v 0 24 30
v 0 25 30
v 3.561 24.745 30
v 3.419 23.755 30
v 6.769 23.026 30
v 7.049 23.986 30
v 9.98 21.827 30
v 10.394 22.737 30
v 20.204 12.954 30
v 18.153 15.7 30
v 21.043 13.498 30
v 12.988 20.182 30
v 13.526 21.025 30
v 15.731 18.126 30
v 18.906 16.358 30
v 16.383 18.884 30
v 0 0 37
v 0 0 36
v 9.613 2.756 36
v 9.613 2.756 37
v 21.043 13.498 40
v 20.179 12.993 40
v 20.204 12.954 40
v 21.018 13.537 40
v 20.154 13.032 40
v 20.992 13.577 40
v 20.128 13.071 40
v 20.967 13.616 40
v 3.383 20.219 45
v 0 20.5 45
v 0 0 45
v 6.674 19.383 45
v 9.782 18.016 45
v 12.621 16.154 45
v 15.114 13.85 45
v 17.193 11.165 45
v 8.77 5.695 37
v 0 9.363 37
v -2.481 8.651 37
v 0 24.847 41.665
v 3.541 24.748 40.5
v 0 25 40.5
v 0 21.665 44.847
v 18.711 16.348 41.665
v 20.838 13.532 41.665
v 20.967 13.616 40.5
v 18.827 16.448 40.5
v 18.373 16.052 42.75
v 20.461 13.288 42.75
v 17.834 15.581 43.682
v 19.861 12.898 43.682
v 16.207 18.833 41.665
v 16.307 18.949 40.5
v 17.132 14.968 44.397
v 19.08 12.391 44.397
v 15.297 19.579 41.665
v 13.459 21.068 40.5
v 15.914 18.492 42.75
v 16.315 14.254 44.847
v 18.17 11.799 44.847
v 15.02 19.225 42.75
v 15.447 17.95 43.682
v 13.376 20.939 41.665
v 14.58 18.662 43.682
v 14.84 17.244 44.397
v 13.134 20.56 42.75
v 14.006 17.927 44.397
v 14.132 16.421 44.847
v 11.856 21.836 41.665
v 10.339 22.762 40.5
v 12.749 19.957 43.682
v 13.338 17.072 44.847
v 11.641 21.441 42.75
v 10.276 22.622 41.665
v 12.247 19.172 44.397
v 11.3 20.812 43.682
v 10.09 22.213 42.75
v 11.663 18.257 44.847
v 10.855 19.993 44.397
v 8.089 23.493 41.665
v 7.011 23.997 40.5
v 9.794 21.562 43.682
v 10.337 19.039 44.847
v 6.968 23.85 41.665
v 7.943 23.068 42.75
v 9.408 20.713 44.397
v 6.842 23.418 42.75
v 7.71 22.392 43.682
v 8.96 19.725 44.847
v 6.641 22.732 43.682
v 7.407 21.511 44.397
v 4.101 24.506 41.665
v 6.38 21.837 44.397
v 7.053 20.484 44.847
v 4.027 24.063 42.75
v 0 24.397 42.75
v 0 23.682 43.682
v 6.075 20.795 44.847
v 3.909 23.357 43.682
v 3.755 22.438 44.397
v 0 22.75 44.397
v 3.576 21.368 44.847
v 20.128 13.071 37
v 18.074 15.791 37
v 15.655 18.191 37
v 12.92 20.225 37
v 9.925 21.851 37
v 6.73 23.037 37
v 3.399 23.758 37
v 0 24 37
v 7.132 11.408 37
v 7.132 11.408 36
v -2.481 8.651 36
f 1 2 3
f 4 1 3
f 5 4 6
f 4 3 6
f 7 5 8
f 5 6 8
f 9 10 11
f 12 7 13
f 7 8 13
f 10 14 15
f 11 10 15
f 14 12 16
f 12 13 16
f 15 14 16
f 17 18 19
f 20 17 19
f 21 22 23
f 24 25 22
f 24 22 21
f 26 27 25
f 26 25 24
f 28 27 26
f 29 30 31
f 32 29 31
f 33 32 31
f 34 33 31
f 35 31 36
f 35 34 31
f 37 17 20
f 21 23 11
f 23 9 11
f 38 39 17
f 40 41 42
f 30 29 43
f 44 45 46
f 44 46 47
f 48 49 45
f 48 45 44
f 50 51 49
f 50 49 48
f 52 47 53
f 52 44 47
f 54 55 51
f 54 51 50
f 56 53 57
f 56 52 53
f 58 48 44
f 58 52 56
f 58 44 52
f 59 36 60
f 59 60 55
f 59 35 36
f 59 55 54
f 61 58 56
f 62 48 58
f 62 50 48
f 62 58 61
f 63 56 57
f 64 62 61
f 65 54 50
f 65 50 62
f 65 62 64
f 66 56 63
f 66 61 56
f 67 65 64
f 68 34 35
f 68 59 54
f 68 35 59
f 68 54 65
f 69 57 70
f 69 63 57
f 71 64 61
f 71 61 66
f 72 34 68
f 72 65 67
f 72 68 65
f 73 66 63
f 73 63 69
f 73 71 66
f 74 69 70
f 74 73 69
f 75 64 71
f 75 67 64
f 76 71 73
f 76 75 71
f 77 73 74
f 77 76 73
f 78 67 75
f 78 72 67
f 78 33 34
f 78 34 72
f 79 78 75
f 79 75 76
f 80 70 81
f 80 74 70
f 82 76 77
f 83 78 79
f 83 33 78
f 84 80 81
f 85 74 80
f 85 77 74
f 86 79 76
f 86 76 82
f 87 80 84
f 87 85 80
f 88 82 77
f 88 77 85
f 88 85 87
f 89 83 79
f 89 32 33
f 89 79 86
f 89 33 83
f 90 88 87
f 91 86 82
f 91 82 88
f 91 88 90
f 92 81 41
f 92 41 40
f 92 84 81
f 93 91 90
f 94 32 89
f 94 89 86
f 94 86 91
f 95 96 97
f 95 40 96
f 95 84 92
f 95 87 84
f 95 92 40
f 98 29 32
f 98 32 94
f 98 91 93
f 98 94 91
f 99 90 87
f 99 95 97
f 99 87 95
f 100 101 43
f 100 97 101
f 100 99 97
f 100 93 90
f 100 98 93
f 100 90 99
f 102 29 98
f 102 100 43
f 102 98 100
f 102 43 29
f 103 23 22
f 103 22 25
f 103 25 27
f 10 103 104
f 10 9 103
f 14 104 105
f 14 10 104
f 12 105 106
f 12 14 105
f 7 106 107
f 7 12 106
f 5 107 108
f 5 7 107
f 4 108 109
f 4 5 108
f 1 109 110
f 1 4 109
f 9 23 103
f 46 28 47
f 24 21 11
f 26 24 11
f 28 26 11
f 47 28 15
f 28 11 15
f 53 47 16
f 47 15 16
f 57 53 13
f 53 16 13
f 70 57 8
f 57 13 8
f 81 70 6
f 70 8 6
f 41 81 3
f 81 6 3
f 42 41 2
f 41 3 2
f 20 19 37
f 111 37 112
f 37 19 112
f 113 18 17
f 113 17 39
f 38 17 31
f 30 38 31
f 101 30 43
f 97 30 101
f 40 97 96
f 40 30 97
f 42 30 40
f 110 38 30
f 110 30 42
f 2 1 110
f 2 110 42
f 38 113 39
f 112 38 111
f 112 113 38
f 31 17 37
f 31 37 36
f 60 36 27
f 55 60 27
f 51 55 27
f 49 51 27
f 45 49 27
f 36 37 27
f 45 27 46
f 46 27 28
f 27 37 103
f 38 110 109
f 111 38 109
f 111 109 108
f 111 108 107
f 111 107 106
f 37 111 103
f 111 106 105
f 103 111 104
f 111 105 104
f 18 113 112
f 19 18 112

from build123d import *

# Parameters (mm, degrees)
BOX002_W               = 10
BOX002_H               = 9
BOX002_DEPTH           = 1
BOX002_PLACEMENT_ANGLE = 16
CYLINDER001_R          = 22
CYLINDER001_DEPTH      = 37
CYLINDER_R             = 25
CYLINDER_DEPTH         = 40
CYLINDER004_R          = 21
CYLINDER004_DEPTH      = 21
CYLINDER003_R          = 23
CYLINDER003_DEPTH      = 10
CYLINDER002_R          = 25
CYLINDER002_DEPTH      = 5
FILLET_R               = 4.5
BOX001_W               = 37
BOX001_H               = 39
BOX001_DEPTH           = 10
BOX001_PLACEMENT_ANGLE = 57
BOX_W                  = 37
BOX_H                  = 39
BOX_DEPTH              = 10
BOX004_W               = 33
BOX004_H               = 70
BOX004_DEPTH           = 17
BOX003_W               = 33
BOX003_H               = 70
BOX003_DEPTH           = 17
BOX003_PLACEMENT_ANGLE = 57
CYLINDER006_R          = 24
CYLINDER006_DEPTH      = 10
CYLINDER005_R          = 25
CYLINDER005_DEPTH      = 10


with BuildPart() as cubo002:
    # Box002 → Box002 (new body)
    with BuildSketch(Plane.XY):
        with Locations((5, 4.5)):
            Rectangle(BOX002_W, BOX002_H)
    extrude(amount=BOX002_DEPTH)


with BuildPart() as cubo002_1:
    # Box002 placement: moved
    add(cubo002.part.moved(Location((0, 0, 36))).rotate(Axis((0, 0, 36), (0, 0, 1)), BOX002_PLACEMENT_ANGLE))


with BuildPart() as cilindro001:
    # Cylinder001 → Cylinder001 (new body)
    with BuildSketch(Plane.XY):
        Circle(CYLINDER001_R)
    extrude(amount=CYLINDER001_DEPTH)


with BuildPart() as cut:
    # Cylinder → Cylinder (new body)
    with BuildSketch(Plane.XY):
        Circle(CYLINDER_R)
    extrude(amount=CYLINDER_DEPTH)

    # Cut: cut Cilindro001
    add(cilindro001.part, mode=Mode.SUBTRACT)


with BuildPart() as cilindro004:
    # Cylinder004 → Cylinder004 (new body)
    with BuildSketch(Plane.XY):
        Circle(CYLINDER004_R)
    extrude(amount=CYLINDER004_DEPTH)


with BuildPart() as cut001:
    # Cylinder003 → Cylinder003 (new body)
    with BuildSketch(Plane.XY):
        Circle(CYLINDER003_R)
    extrude(amount=CYLINDER003_DEPTH)

    # Cut001: cut Cilindro004
    add(cilindro004.part, mode=Mode.SUBTRACT)


with BuildPart() as cut001_1:
    # Cut001 placement: moved
    add(cut001.part.moved(Location((0, 0, -5))))


with BuildPart() as fusion:
    # Cylinder002 → Cylinder002 (new body)
    with BuildSketch(Plane.XY.offset(40)):
        Circle(CYLINDER002_R)
    extrude(amount=CYLINDER002_DEPTH)

    # Fillet
    fillet_edges = [fusion.edges().sort_by_distance(p)[0] for p in [
        (-25, 0, 45),
    ]]
    fillet(fillet_edges, radius=FILLET_R)

    # Fusion: union Cut, Cut001
    add(cut.part)
    add(cut001_1.part)


with BuildPart() as cubo001:
    # Box001 → Box001 (new body)
    with BuildSketch(Plane.XY):
        with Locations((18.5, 19.5)):
            Rectangle(BOX001_W, BOX001_H)
    extrude(amount=BOX001_DEPTH)


with BuildPart() as cubo001_1:
    # Box001 placement: moved
    add(cubo001.part.moved(Location((0, 0, 37))).rotate(Axis((0, 0, 37), (0, 0, -1)), BOX001_PLACEMENT_ANGLE))


with BuildPart() as common:
    # Box → Box (new body)
    with BuildSketch(Plane.XY.offset(37)):
        with Locations((18.5, 19.5)):
            Rectangle(BOX_W, BOX_H)
    extrude(amount=BOX_DEPTH)

    # Cut002: cut Cubo001
    add(cubo001_1.part, mode=Mode.SUBTRACT)

    # Common: intersect Fusion
    add(fusion.part, mode=Mode.INTERSECT)


with BuildPart() as cubo004:
    # Box004 → Box004 (new body)
    with BuildSketch(Plane(origin=(-33, -19, 29), x_dir=(1, 0, 0), z_dir=(0, 0, 1))):
        with Locations((16.5, 35)):
            Rectangle(BOX004_W, BOX004_H)
    extrude(amount=BOX004_DEPTH)


with BuildPart() as fusion001:
    # Box003 → Box003 (new body)
    with BuildSketch(Plane.XY):
        with Locations((16.5, 35)):
            Rectangle(BOX003_W, BOX003_H)
    extrude(amount=BOX003_DEPTH)


with BuildPart() as fusion001_1:
    # Box003 placement: moved
    add(fusion001.part.moved(Location((-29, -19, 29))).rotate(Axis((-29, -19, 29), (0, 0, -1)), BOX003_PLACEMENT_ANGLE))

    # Fusion001: union Cubo004
    add(cubo004.part)


with BuildPart() as cilindro006:
    # Cylinder006 → Cylinder006 (new body)
    with BuildSketch(Plane.XY.offset(34)):
        Circle(CYLINDER006_R)
    extrude(amount=CYLINDER006_DEPTH)


with BuildPart() as fusion002:
    # Cylinder005 → Cylinder005 (new body)
    with BuildSketch(Plane.XY.offset(34)):
        Circle(CYLINDER005_R)
    extrude(amount=CYLINDER005_DEPTH)

    # Cut003: cut Cilindro006
    add(cilindro006.part, mode=Mode.SUBTRACT)

    # Cut004: cut Fusion001
    add(fusion001_1.part, mode=Mode.SUBTRACT)


with BuildPart() as fusion002_1:
    # Cut004 placement: moved
    add(fusion002.part.moved(Location((0, 0, -4))))

    # Fusion002: union Cubo002, Common
    add(cubo002_1.part)
    add(common.part)


solid = fusion002_1.part
